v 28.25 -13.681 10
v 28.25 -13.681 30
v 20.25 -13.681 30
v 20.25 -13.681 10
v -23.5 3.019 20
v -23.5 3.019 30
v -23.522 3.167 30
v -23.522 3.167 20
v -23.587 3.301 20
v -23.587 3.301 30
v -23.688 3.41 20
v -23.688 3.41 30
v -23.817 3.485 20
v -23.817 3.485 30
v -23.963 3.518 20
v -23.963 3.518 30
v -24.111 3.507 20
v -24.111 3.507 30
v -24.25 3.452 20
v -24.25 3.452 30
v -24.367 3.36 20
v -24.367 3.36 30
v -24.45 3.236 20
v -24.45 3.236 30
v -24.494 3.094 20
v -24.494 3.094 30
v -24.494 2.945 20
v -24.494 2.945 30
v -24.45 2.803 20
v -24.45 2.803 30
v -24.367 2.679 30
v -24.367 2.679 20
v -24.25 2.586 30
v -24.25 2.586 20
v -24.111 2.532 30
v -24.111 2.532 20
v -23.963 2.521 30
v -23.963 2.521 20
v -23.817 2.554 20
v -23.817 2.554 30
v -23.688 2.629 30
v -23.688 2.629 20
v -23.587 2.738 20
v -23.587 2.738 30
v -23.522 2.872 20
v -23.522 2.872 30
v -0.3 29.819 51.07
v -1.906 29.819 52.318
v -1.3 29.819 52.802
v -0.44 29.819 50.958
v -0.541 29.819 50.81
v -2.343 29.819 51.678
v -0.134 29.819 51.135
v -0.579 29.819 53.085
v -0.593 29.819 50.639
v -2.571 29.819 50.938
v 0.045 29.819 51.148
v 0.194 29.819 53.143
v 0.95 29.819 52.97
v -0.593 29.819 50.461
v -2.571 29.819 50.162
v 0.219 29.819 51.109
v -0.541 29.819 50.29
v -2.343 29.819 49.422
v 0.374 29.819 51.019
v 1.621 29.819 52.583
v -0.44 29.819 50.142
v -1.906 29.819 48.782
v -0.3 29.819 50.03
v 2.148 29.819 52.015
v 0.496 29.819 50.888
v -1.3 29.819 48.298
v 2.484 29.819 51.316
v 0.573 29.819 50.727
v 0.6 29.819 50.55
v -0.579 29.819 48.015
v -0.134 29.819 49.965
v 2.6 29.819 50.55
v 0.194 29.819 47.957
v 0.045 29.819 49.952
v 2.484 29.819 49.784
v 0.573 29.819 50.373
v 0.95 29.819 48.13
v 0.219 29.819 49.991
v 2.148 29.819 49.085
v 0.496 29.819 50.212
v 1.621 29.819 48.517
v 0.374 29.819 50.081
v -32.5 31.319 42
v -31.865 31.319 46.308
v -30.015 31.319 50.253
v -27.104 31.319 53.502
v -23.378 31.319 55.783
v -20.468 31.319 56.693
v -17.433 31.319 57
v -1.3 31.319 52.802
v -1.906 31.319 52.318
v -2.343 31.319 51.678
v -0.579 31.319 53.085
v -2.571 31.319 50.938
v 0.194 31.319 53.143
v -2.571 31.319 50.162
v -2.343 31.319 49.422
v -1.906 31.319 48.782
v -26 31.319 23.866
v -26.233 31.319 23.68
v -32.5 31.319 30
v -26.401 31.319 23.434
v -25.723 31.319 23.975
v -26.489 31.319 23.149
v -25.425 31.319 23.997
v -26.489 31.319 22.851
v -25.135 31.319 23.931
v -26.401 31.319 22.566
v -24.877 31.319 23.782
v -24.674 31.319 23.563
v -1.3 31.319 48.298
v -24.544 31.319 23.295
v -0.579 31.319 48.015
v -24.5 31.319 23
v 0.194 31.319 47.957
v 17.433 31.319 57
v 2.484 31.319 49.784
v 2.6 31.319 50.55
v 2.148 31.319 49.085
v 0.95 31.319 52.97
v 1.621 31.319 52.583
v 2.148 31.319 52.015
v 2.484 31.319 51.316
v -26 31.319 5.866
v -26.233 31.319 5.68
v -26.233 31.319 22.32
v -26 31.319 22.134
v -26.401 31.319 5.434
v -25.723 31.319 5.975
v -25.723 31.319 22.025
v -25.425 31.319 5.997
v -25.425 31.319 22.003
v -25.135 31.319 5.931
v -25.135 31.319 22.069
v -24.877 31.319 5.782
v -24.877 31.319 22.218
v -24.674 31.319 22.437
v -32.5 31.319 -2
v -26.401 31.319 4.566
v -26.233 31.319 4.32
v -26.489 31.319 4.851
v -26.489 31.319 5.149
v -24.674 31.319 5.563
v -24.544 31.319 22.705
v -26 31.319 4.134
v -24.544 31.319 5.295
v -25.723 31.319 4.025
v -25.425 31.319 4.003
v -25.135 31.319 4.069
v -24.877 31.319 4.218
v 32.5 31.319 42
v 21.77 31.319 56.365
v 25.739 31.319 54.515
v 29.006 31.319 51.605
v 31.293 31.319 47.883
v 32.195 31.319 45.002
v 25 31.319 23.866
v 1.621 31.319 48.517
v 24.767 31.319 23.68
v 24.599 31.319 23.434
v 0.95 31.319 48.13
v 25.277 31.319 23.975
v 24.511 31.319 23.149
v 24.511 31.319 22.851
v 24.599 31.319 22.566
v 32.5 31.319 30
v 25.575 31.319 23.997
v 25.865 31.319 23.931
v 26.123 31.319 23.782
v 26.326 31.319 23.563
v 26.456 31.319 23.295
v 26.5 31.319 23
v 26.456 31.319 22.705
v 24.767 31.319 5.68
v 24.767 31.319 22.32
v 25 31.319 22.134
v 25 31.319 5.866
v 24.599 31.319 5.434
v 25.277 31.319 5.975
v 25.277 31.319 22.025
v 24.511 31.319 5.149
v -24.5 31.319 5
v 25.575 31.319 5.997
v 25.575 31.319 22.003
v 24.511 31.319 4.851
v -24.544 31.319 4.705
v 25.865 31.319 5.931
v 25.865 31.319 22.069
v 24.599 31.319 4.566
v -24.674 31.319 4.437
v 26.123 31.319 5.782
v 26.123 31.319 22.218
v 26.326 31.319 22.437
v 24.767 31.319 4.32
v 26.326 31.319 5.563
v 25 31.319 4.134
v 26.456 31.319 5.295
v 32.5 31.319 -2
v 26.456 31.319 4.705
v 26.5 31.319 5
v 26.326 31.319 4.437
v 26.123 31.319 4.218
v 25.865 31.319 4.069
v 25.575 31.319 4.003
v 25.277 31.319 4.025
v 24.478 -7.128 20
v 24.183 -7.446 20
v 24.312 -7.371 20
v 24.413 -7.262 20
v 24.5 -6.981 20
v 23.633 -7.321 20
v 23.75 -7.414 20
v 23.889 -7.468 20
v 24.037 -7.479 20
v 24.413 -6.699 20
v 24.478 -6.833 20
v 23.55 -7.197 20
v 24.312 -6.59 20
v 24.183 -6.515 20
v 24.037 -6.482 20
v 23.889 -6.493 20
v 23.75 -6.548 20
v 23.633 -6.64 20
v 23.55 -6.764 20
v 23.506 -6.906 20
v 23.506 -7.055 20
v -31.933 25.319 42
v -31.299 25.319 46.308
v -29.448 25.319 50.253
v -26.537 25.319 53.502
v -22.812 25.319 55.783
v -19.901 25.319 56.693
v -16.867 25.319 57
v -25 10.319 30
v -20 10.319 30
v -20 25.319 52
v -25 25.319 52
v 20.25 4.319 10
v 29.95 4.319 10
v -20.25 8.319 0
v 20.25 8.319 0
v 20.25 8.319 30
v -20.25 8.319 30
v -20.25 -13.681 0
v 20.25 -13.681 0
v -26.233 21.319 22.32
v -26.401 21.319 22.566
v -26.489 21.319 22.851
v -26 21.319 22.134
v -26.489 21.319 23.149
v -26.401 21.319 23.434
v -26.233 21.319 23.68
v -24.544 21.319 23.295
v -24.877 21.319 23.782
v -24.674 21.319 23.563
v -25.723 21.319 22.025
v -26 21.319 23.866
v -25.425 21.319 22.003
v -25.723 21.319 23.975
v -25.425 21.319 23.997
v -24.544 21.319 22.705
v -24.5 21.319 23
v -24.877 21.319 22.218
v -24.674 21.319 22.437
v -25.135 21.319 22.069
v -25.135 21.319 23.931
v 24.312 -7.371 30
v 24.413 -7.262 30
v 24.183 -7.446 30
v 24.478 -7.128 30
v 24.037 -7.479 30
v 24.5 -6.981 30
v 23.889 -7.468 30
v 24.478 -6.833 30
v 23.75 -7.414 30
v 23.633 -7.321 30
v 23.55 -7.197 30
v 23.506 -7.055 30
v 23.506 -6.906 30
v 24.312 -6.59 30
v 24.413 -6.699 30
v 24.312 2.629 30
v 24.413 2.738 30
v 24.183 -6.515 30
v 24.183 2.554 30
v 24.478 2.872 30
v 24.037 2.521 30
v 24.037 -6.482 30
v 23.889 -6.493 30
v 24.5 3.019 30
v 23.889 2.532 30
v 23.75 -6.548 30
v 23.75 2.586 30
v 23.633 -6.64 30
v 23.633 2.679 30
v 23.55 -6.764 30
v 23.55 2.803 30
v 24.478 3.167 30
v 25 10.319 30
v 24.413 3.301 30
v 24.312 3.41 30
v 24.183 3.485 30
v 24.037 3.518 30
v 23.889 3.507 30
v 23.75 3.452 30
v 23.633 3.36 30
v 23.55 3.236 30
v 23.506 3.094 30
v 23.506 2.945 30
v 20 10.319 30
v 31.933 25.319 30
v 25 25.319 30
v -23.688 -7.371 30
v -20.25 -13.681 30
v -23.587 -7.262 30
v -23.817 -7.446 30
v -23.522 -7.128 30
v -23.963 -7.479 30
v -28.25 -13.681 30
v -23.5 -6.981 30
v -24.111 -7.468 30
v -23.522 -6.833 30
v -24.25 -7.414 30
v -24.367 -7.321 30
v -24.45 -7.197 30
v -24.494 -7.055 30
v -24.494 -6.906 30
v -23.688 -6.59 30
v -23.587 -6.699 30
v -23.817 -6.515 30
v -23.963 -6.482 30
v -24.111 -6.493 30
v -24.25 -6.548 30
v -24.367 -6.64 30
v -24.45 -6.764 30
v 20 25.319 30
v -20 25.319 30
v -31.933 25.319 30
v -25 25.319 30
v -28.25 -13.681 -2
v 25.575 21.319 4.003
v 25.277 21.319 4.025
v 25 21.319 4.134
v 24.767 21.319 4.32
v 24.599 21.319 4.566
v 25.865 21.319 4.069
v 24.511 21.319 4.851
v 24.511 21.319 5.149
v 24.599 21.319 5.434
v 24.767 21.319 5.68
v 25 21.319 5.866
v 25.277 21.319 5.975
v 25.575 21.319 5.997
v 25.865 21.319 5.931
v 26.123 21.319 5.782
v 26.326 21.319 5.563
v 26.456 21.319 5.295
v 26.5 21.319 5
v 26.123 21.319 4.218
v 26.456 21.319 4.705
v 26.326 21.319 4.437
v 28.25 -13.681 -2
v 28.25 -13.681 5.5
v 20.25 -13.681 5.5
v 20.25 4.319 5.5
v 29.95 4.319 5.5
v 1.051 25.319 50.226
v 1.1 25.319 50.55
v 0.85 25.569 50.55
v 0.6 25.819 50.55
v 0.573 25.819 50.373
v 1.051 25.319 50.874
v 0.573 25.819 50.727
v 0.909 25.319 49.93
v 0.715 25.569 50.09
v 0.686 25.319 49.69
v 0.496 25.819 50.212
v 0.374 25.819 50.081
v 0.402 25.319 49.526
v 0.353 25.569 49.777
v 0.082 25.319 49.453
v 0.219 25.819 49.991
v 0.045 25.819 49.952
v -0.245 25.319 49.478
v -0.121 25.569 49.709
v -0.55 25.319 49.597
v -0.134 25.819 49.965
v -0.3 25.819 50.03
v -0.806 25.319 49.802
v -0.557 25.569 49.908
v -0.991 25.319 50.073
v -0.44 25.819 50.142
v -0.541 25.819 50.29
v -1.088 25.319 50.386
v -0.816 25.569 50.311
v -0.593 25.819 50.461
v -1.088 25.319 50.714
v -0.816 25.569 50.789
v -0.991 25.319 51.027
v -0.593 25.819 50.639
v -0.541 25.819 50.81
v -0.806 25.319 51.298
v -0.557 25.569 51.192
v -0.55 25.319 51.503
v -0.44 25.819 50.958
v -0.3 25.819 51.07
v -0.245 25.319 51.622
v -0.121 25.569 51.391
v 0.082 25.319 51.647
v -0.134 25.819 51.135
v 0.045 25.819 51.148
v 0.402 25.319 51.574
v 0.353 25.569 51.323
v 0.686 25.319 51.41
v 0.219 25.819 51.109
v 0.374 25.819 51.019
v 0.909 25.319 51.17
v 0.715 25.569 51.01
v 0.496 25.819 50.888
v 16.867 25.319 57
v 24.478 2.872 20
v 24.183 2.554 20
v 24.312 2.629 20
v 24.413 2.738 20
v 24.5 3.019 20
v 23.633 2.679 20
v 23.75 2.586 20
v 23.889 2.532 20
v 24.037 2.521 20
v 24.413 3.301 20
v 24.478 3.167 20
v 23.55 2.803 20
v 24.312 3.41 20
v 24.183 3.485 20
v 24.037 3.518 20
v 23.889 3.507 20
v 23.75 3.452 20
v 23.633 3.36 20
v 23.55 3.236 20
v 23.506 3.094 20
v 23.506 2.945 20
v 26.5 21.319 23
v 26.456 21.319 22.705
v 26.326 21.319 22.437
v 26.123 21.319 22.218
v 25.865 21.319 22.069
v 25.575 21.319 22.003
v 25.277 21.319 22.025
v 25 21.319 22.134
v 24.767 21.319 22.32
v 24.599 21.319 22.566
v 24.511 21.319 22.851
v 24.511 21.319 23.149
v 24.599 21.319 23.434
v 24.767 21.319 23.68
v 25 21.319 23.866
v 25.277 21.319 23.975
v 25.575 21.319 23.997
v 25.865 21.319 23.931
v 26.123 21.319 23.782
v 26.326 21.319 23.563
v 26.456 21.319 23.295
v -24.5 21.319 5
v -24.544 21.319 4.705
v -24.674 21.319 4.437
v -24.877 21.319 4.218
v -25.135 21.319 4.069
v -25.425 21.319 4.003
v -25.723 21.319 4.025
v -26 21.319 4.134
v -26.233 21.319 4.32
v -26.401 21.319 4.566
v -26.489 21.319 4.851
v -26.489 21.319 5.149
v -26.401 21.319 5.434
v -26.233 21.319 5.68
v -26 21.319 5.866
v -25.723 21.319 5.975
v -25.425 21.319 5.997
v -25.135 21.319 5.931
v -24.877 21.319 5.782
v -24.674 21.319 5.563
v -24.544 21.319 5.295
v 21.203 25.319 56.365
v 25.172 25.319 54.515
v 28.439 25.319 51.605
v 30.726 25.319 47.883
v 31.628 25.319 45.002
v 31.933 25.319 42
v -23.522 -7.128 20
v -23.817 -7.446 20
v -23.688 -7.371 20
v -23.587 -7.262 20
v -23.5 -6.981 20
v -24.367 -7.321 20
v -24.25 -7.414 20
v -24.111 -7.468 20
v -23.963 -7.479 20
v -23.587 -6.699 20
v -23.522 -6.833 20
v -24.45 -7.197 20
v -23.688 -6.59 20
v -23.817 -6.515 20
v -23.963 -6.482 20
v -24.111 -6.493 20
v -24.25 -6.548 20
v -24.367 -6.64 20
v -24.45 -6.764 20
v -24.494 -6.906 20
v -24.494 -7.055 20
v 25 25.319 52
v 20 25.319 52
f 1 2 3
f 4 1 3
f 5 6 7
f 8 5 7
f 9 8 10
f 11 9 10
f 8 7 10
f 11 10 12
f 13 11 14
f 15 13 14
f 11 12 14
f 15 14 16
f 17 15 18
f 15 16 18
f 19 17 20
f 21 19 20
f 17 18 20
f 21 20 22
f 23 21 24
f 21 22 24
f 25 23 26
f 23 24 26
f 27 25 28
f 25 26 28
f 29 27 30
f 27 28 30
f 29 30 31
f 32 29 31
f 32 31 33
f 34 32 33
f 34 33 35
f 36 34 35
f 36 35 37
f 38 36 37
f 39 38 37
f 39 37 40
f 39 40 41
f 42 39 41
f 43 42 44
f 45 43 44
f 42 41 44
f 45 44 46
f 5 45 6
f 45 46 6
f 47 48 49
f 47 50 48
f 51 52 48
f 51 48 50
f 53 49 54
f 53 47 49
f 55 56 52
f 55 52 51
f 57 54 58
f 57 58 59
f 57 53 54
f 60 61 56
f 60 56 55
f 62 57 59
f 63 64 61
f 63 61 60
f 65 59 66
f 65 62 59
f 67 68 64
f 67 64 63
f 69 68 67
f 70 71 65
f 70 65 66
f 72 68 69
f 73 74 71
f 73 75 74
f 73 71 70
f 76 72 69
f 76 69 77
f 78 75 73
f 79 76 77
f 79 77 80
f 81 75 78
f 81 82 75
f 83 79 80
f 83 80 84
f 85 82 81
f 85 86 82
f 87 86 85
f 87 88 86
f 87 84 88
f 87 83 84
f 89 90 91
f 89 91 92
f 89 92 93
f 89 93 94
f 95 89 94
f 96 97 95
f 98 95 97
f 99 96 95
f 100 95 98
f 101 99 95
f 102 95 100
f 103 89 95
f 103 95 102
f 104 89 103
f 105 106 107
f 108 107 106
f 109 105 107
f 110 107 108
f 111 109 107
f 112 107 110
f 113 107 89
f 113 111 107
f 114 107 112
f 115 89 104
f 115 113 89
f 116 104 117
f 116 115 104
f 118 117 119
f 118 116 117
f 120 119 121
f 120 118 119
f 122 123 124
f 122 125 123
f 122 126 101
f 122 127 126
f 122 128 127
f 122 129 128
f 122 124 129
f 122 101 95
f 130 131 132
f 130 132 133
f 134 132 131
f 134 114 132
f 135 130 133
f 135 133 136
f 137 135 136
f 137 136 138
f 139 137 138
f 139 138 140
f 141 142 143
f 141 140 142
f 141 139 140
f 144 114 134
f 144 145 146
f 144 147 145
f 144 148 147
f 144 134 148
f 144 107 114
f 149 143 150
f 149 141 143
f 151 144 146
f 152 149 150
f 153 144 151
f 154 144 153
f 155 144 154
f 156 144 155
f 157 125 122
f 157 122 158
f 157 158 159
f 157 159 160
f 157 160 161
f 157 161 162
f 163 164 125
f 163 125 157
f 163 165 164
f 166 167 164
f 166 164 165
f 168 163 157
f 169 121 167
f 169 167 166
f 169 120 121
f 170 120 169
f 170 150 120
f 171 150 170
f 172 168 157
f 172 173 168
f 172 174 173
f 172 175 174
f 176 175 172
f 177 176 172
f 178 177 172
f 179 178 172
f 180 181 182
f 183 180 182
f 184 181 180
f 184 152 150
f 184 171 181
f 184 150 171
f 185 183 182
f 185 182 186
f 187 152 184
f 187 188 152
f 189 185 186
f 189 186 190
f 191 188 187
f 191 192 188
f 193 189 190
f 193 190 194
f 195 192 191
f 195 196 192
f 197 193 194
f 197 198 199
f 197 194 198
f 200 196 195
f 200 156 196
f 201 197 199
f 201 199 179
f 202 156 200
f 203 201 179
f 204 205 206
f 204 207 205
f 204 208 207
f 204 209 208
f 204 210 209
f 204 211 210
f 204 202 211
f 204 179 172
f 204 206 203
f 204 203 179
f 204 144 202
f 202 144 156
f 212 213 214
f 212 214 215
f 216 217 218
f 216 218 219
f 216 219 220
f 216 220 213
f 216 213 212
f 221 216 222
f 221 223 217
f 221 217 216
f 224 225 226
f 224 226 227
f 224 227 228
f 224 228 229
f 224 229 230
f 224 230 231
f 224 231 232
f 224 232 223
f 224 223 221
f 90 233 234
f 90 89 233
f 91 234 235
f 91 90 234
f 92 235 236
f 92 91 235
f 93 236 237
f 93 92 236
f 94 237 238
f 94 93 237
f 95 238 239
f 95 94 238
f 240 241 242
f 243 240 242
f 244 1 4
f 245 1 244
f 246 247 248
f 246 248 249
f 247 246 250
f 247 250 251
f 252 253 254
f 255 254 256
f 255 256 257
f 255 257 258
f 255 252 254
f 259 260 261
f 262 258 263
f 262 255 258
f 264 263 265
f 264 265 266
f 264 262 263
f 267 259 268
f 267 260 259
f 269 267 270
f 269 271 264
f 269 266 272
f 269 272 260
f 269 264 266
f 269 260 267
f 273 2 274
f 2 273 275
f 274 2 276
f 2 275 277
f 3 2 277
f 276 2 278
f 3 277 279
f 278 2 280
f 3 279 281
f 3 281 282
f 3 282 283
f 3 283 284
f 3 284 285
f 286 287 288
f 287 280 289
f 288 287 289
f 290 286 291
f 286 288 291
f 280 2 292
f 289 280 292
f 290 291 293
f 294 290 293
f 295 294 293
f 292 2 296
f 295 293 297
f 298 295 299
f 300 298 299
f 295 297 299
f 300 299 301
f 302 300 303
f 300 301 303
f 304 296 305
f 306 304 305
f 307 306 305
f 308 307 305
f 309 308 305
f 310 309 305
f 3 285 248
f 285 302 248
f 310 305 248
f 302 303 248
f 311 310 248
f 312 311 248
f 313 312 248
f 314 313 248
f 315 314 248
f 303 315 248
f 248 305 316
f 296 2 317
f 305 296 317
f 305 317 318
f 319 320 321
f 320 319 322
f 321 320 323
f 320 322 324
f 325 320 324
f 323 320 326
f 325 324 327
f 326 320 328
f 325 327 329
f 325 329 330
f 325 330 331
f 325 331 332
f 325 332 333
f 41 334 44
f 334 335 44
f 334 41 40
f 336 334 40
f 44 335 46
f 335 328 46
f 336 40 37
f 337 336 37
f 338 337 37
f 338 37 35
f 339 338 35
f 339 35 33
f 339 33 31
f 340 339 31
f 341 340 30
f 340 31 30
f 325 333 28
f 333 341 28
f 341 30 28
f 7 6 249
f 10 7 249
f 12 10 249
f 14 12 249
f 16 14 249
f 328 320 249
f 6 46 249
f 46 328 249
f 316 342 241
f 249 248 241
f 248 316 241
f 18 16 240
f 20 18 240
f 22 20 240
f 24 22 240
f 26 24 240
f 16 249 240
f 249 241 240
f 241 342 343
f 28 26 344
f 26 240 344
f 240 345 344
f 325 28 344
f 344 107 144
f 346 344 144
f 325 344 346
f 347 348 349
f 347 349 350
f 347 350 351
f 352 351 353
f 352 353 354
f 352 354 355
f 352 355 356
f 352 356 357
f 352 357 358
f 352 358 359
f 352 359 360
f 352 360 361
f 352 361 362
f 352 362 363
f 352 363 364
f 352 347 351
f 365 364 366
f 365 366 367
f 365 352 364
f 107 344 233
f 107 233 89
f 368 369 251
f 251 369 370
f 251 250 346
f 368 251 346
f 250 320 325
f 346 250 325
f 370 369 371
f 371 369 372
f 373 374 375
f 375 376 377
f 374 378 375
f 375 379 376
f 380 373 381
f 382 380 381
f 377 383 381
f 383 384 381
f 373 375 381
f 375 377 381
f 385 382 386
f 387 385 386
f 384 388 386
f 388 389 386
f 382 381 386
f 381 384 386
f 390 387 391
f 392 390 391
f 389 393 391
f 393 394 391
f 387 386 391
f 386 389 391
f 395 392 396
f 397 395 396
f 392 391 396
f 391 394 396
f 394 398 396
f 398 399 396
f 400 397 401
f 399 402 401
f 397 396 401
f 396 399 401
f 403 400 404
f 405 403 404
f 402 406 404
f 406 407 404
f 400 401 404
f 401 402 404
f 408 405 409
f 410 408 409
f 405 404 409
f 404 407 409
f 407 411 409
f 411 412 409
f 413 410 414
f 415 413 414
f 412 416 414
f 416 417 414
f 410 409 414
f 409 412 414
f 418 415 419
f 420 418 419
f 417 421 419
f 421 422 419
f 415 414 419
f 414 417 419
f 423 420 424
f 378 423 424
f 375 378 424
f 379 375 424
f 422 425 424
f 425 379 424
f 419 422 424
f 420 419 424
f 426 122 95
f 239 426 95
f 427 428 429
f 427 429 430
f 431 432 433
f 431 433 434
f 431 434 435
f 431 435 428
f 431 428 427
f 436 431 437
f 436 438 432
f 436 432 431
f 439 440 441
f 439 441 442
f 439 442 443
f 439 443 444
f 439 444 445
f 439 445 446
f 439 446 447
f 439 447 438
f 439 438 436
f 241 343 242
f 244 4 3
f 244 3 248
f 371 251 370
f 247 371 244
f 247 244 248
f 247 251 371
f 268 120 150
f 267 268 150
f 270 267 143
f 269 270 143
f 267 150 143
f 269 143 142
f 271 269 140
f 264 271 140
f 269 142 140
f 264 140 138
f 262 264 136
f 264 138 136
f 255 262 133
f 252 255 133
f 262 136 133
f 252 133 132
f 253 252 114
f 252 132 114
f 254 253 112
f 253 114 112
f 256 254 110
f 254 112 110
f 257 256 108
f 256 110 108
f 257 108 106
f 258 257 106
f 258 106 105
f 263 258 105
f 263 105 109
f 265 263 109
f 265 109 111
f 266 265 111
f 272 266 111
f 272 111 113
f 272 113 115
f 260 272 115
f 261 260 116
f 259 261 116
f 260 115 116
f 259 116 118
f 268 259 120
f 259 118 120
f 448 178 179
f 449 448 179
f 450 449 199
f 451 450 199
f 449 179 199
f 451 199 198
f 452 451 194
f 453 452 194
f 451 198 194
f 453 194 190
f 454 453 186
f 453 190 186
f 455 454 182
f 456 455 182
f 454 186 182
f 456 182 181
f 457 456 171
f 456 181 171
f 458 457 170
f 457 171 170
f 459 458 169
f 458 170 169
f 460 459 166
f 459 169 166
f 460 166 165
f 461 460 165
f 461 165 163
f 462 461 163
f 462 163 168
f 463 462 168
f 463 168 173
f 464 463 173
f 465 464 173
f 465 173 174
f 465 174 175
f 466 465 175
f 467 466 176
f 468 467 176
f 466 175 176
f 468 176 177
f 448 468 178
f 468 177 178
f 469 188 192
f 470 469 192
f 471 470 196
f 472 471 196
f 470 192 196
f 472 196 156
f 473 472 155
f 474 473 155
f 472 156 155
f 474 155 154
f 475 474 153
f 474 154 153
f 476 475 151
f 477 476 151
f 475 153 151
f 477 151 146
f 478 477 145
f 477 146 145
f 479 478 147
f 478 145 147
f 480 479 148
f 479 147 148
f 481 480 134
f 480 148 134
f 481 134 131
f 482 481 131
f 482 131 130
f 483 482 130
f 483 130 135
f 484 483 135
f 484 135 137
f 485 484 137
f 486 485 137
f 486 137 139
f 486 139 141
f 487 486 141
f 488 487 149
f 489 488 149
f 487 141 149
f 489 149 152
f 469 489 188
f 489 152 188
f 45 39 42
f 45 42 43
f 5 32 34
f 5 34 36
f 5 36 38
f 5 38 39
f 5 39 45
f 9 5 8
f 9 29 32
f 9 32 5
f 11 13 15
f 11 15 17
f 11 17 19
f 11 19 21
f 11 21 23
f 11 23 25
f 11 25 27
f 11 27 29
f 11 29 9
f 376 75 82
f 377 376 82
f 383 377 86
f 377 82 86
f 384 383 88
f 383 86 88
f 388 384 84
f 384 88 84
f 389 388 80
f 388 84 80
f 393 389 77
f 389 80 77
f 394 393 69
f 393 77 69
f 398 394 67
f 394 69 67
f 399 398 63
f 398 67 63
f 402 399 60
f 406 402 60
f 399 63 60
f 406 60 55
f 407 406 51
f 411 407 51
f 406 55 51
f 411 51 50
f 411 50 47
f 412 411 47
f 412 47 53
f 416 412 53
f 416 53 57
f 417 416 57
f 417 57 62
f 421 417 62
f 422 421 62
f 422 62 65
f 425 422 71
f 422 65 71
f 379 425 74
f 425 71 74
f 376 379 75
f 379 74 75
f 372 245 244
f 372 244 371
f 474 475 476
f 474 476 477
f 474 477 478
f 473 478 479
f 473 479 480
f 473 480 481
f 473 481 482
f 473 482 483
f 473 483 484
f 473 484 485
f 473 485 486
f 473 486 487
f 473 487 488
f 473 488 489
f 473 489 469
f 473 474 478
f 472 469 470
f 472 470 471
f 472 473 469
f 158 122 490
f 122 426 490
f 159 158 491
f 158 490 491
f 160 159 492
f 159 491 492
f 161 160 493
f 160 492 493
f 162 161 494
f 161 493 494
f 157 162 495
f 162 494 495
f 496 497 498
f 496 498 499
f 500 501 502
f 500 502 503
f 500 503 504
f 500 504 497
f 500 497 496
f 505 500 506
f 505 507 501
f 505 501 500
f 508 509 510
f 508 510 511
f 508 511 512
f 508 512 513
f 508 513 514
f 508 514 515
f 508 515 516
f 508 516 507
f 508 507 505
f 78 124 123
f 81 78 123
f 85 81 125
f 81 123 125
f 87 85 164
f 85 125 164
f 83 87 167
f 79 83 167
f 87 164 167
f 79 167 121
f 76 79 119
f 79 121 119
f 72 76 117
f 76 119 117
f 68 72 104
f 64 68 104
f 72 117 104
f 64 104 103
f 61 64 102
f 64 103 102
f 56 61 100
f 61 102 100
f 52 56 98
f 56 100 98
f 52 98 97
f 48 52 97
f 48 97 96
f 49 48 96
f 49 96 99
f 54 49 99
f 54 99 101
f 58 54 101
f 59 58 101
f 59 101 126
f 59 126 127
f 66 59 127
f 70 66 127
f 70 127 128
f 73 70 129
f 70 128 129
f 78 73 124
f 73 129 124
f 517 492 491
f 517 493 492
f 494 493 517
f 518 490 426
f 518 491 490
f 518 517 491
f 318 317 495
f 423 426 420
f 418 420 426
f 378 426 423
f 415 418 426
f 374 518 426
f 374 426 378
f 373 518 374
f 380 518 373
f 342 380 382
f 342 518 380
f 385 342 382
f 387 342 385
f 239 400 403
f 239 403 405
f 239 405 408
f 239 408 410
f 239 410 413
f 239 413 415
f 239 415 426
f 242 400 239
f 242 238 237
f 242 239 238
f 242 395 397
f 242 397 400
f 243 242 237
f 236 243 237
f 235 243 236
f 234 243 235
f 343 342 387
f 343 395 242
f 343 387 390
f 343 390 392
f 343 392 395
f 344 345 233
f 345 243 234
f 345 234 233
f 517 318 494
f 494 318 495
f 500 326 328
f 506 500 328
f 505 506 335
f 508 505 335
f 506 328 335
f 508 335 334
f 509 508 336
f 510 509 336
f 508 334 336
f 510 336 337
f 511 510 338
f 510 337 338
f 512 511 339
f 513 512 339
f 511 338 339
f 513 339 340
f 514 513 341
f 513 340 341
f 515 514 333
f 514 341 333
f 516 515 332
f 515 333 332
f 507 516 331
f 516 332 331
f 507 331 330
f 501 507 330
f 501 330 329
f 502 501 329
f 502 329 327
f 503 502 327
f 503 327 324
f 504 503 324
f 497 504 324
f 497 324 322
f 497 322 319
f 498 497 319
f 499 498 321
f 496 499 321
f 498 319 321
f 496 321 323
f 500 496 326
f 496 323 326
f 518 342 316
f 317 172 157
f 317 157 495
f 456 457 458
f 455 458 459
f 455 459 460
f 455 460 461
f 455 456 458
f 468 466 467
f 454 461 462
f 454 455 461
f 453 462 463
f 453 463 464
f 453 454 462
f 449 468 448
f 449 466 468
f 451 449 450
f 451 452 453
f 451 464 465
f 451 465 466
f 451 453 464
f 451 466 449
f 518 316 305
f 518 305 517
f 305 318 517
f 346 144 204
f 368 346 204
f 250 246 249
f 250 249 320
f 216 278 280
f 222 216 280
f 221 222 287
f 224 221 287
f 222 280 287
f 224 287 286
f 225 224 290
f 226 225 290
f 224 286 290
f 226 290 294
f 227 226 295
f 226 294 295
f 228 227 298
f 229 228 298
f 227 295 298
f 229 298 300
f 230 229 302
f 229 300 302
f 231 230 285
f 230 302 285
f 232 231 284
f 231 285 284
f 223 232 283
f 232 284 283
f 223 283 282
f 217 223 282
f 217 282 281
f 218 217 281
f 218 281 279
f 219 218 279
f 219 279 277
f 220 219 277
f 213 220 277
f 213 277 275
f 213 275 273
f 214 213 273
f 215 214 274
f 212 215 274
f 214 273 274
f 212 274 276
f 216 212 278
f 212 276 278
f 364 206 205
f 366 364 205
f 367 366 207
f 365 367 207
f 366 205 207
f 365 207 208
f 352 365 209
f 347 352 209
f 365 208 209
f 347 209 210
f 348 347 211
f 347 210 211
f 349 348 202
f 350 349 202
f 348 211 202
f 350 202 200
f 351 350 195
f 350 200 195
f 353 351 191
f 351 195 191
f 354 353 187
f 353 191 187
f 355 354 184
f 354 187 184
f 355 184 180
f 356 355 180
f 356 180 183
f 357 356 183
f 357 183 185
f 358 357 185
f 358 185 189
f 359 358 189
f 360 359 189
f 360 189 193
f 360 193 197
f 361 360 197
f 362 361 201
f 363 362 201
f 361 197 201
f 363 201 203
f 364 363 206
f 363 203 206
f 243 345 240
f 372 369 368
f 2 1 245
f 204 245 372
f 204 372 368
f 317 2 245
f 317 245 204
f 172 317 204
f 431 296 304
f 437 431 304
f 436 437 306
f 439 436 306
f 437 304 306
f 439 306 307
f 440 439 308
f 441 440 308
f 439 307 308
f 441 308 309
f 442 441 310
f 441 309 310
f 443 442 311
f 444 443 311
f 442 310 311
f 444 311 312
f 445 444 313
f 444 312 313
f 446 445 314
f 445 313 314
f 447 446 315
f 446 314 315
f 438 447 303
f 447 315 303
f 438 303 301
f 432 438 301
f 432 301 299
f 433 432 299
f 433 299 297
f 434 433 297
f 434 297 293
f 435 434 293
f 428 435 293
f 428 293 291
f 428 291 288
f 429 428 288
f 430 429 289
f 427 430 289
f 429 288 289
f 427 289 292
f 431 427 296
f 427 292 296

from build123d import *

# Parameters (mm, degrees)
RESSALTO_EXTRUS_O1_DEPTH = 30
ESBO_O3_W                = 4.5
ESBO_O3_H                = 18
CORTE_EXTRUS_O2_DEPTH    = 28.5
RESSALTO_EXTRUS_O2_DEPTH = 2
ESBO_O5_R                = 0.5
CORTE_EXTRUS_O3_DEPTH    = 10
ESBO_O6_R                = 1
CORTE_EXTRUS_O4_DEPTH    = 10
RESSALTO_EXTRUS_O3_DEPTH = 27
RESSALTO_EXTRUS_O4_DEPTH = 5
FILETE1_R                = 15
ESBO_O11_R               = 2.6
CORTE_EXTRUS_O5_DEPTH    = 1.5
ESBO_O12_R               = 0.6
CORTE_EXTRUS_O6_DEPTH    = 4.5
CHANFRO1_SIZE            = 0.5


with BuildPart() as part:
    # Esboço1 → Ressalto-extrusão1 (new body)
    with BuildSketch(Plane.XY):
        Polygon((-32.5, 31.319481807), (32.5, 31.319481807), (28.25, -13.680518193), (20.25, -13.680518193), (20.25, 8.319481807), (-20.25, 8.319481807), (-20.25, -13.680518193), (-28.25, -13.680518193), align=None)
    extrude(amount=RESSALTO_EXTRUS_O1_DEPTH)

    # Esboço3 → Corte-extrusão2 (cut)
    with BuildSketch(Plane(origin=(40, 0, 0), x_dir=(0, 0, -1), z_dir=(1, 0, 0))):
        with Locations((-7.75, -4.680518193)):
            Rectangle(ESBO_O3_W, ESBO_O3_H)
    extrude(amount=-CORTE_EXTRUS_O2_DEPTH, mode=Mode.SUBTRACT)

    # Esboço4 → Ressalto-extrusão2 (add)
    with BuildSketch(Plane(origin=(0, 0, 0), x_dir=(-1, 0, 0), z_dir=(0, 0, -1))):
        Polygon((-32.5, 31.319481807), (32.5, 31.319481807), (28.25, -13.680518193), (20.25, -13.680518193), (-20.25, -13.680518193), (-28.25, -13.680518193), align=None)
    extrude(amount=RESSALTO_EXTRUS_O2_DEPTH)

    # Esboço5 → Corte-extrusão3 (cut)
    with BuildSketch(Plane.XY.offset(30)):
        with Locations((-24, 3.019481807)):
            Circle(ESBO_O5_R)
        with Locations((24, 3.019481807)):
            Circle(ESBO_O5_R)
        with Locations((-24, -6.980518193)):
            Circle(ESBO_O5_R)
        with Locations((24, -6.980518193)):
            Circle(ESBO_O5_R)
    extrude(amount=-CORTE_EXTRUS_O3_DEPTH, mode=Mode.SUBTRACT)

    # Esboço6 → Corte-extrusão4 (cut)
    with BuildSketch(Plane(origin=(0, 31.319481807, 0), x_dir=(1, 0, 0), z_dir=(0, 1, 0))):
        with Locations((-25.5, -5)):
            Circle(ESBO_O6_R)
        with Locations((-25.5, -23)):
            Circle(ESBO_O6_R)
        with Locations((25.5, -5)):
            Circle(ESBO_O6_R)
        with Locations((25.5, -23)):
            Circle(ESBO_O6_R)
    extrude(amount=-CORTE_EXTRUS_O4_DEPTH, mode=Mode.SUBTRACT)

    # Esboço7 → Ressalto-extrusão3 (add)
    with BuildSketch(Plane.XY.offset(30)):
        Polygon((-32.5, 31.319481807), (32.5, 31.319481807), (31.933333333, 25.319481807), (-31.933333333, 25.319481807), align=None)
    extrude(amount=RESSALTO_EXTRUS_O3_DEPTH)

    # Esboço10 → Ressalto-extrusão4 (add)
    with BuildSketch(Plane(origin=(20, 0, 0), x_dir=(0, 0, -1), z_dir=(1, 0, 0))):
        Polygon((-30, 25.319481807), (-30, 10.319481807), (-52, 25.319481807), align=None)
    ressalto_extrus_o4 = extrude(amount=RESSALTO_EXTRUS_O4_DEPTH)

    # Espelhar1: Ressalto-extrusão4 across plane
    add(ressalto_extrus_o4.mirror(Plane(origin=(0, 0, 0), x_dir=(0, 0, 1), z_dir=(1, 0, 0))))

    # Filete1
    filete1_edges = [part.edges().sort_by_distance(p)[0] for p in [
        (-32.216666667, 28.319481807, 57),
        (32.216666667, 28.319481807, 57),
    ]]
    fillet(filete1_edges, radius=FILETE1_R)

    # Esboço11 → Corte-extrusão5 (cut)
    with BuildSketch(Plane(origin=(0, 31.319481807, 0), x_dir=(1, 0, 0), z_dir=(0, 1, 0))):
        with Locations((0, -50.55)):
            Circle(ESBO_O11_R)
    extrude(amount=-CORTE_EXTRUS_O5_DEPTH, mode=Mode.SUBTRACT)

    # Esboço12 → Corte-extrusão6 (cut)
    with BuildSketch(Plane(origin=(0, 29.819481807, 0), x_dir=(1, 0, 0), z_dir=(0, 1, 0))):
        with Locations((0, -50.55)):
            Circle(ESBO_O12_R)
    extrude(amount=-CORTE_EXTRUS_O6_DEPTH, mode=Mode.SUBTRACT)

    # Chanfro1
    chanfro1_edges = [part.edges().sort_by_distance(p)[0] for p in [
        (-0.6, 25.319481807, 50.55),
    ]]
    chamfer(chanfro1_edges, length=CHANFRO1_SIZE)


solid = part.part
